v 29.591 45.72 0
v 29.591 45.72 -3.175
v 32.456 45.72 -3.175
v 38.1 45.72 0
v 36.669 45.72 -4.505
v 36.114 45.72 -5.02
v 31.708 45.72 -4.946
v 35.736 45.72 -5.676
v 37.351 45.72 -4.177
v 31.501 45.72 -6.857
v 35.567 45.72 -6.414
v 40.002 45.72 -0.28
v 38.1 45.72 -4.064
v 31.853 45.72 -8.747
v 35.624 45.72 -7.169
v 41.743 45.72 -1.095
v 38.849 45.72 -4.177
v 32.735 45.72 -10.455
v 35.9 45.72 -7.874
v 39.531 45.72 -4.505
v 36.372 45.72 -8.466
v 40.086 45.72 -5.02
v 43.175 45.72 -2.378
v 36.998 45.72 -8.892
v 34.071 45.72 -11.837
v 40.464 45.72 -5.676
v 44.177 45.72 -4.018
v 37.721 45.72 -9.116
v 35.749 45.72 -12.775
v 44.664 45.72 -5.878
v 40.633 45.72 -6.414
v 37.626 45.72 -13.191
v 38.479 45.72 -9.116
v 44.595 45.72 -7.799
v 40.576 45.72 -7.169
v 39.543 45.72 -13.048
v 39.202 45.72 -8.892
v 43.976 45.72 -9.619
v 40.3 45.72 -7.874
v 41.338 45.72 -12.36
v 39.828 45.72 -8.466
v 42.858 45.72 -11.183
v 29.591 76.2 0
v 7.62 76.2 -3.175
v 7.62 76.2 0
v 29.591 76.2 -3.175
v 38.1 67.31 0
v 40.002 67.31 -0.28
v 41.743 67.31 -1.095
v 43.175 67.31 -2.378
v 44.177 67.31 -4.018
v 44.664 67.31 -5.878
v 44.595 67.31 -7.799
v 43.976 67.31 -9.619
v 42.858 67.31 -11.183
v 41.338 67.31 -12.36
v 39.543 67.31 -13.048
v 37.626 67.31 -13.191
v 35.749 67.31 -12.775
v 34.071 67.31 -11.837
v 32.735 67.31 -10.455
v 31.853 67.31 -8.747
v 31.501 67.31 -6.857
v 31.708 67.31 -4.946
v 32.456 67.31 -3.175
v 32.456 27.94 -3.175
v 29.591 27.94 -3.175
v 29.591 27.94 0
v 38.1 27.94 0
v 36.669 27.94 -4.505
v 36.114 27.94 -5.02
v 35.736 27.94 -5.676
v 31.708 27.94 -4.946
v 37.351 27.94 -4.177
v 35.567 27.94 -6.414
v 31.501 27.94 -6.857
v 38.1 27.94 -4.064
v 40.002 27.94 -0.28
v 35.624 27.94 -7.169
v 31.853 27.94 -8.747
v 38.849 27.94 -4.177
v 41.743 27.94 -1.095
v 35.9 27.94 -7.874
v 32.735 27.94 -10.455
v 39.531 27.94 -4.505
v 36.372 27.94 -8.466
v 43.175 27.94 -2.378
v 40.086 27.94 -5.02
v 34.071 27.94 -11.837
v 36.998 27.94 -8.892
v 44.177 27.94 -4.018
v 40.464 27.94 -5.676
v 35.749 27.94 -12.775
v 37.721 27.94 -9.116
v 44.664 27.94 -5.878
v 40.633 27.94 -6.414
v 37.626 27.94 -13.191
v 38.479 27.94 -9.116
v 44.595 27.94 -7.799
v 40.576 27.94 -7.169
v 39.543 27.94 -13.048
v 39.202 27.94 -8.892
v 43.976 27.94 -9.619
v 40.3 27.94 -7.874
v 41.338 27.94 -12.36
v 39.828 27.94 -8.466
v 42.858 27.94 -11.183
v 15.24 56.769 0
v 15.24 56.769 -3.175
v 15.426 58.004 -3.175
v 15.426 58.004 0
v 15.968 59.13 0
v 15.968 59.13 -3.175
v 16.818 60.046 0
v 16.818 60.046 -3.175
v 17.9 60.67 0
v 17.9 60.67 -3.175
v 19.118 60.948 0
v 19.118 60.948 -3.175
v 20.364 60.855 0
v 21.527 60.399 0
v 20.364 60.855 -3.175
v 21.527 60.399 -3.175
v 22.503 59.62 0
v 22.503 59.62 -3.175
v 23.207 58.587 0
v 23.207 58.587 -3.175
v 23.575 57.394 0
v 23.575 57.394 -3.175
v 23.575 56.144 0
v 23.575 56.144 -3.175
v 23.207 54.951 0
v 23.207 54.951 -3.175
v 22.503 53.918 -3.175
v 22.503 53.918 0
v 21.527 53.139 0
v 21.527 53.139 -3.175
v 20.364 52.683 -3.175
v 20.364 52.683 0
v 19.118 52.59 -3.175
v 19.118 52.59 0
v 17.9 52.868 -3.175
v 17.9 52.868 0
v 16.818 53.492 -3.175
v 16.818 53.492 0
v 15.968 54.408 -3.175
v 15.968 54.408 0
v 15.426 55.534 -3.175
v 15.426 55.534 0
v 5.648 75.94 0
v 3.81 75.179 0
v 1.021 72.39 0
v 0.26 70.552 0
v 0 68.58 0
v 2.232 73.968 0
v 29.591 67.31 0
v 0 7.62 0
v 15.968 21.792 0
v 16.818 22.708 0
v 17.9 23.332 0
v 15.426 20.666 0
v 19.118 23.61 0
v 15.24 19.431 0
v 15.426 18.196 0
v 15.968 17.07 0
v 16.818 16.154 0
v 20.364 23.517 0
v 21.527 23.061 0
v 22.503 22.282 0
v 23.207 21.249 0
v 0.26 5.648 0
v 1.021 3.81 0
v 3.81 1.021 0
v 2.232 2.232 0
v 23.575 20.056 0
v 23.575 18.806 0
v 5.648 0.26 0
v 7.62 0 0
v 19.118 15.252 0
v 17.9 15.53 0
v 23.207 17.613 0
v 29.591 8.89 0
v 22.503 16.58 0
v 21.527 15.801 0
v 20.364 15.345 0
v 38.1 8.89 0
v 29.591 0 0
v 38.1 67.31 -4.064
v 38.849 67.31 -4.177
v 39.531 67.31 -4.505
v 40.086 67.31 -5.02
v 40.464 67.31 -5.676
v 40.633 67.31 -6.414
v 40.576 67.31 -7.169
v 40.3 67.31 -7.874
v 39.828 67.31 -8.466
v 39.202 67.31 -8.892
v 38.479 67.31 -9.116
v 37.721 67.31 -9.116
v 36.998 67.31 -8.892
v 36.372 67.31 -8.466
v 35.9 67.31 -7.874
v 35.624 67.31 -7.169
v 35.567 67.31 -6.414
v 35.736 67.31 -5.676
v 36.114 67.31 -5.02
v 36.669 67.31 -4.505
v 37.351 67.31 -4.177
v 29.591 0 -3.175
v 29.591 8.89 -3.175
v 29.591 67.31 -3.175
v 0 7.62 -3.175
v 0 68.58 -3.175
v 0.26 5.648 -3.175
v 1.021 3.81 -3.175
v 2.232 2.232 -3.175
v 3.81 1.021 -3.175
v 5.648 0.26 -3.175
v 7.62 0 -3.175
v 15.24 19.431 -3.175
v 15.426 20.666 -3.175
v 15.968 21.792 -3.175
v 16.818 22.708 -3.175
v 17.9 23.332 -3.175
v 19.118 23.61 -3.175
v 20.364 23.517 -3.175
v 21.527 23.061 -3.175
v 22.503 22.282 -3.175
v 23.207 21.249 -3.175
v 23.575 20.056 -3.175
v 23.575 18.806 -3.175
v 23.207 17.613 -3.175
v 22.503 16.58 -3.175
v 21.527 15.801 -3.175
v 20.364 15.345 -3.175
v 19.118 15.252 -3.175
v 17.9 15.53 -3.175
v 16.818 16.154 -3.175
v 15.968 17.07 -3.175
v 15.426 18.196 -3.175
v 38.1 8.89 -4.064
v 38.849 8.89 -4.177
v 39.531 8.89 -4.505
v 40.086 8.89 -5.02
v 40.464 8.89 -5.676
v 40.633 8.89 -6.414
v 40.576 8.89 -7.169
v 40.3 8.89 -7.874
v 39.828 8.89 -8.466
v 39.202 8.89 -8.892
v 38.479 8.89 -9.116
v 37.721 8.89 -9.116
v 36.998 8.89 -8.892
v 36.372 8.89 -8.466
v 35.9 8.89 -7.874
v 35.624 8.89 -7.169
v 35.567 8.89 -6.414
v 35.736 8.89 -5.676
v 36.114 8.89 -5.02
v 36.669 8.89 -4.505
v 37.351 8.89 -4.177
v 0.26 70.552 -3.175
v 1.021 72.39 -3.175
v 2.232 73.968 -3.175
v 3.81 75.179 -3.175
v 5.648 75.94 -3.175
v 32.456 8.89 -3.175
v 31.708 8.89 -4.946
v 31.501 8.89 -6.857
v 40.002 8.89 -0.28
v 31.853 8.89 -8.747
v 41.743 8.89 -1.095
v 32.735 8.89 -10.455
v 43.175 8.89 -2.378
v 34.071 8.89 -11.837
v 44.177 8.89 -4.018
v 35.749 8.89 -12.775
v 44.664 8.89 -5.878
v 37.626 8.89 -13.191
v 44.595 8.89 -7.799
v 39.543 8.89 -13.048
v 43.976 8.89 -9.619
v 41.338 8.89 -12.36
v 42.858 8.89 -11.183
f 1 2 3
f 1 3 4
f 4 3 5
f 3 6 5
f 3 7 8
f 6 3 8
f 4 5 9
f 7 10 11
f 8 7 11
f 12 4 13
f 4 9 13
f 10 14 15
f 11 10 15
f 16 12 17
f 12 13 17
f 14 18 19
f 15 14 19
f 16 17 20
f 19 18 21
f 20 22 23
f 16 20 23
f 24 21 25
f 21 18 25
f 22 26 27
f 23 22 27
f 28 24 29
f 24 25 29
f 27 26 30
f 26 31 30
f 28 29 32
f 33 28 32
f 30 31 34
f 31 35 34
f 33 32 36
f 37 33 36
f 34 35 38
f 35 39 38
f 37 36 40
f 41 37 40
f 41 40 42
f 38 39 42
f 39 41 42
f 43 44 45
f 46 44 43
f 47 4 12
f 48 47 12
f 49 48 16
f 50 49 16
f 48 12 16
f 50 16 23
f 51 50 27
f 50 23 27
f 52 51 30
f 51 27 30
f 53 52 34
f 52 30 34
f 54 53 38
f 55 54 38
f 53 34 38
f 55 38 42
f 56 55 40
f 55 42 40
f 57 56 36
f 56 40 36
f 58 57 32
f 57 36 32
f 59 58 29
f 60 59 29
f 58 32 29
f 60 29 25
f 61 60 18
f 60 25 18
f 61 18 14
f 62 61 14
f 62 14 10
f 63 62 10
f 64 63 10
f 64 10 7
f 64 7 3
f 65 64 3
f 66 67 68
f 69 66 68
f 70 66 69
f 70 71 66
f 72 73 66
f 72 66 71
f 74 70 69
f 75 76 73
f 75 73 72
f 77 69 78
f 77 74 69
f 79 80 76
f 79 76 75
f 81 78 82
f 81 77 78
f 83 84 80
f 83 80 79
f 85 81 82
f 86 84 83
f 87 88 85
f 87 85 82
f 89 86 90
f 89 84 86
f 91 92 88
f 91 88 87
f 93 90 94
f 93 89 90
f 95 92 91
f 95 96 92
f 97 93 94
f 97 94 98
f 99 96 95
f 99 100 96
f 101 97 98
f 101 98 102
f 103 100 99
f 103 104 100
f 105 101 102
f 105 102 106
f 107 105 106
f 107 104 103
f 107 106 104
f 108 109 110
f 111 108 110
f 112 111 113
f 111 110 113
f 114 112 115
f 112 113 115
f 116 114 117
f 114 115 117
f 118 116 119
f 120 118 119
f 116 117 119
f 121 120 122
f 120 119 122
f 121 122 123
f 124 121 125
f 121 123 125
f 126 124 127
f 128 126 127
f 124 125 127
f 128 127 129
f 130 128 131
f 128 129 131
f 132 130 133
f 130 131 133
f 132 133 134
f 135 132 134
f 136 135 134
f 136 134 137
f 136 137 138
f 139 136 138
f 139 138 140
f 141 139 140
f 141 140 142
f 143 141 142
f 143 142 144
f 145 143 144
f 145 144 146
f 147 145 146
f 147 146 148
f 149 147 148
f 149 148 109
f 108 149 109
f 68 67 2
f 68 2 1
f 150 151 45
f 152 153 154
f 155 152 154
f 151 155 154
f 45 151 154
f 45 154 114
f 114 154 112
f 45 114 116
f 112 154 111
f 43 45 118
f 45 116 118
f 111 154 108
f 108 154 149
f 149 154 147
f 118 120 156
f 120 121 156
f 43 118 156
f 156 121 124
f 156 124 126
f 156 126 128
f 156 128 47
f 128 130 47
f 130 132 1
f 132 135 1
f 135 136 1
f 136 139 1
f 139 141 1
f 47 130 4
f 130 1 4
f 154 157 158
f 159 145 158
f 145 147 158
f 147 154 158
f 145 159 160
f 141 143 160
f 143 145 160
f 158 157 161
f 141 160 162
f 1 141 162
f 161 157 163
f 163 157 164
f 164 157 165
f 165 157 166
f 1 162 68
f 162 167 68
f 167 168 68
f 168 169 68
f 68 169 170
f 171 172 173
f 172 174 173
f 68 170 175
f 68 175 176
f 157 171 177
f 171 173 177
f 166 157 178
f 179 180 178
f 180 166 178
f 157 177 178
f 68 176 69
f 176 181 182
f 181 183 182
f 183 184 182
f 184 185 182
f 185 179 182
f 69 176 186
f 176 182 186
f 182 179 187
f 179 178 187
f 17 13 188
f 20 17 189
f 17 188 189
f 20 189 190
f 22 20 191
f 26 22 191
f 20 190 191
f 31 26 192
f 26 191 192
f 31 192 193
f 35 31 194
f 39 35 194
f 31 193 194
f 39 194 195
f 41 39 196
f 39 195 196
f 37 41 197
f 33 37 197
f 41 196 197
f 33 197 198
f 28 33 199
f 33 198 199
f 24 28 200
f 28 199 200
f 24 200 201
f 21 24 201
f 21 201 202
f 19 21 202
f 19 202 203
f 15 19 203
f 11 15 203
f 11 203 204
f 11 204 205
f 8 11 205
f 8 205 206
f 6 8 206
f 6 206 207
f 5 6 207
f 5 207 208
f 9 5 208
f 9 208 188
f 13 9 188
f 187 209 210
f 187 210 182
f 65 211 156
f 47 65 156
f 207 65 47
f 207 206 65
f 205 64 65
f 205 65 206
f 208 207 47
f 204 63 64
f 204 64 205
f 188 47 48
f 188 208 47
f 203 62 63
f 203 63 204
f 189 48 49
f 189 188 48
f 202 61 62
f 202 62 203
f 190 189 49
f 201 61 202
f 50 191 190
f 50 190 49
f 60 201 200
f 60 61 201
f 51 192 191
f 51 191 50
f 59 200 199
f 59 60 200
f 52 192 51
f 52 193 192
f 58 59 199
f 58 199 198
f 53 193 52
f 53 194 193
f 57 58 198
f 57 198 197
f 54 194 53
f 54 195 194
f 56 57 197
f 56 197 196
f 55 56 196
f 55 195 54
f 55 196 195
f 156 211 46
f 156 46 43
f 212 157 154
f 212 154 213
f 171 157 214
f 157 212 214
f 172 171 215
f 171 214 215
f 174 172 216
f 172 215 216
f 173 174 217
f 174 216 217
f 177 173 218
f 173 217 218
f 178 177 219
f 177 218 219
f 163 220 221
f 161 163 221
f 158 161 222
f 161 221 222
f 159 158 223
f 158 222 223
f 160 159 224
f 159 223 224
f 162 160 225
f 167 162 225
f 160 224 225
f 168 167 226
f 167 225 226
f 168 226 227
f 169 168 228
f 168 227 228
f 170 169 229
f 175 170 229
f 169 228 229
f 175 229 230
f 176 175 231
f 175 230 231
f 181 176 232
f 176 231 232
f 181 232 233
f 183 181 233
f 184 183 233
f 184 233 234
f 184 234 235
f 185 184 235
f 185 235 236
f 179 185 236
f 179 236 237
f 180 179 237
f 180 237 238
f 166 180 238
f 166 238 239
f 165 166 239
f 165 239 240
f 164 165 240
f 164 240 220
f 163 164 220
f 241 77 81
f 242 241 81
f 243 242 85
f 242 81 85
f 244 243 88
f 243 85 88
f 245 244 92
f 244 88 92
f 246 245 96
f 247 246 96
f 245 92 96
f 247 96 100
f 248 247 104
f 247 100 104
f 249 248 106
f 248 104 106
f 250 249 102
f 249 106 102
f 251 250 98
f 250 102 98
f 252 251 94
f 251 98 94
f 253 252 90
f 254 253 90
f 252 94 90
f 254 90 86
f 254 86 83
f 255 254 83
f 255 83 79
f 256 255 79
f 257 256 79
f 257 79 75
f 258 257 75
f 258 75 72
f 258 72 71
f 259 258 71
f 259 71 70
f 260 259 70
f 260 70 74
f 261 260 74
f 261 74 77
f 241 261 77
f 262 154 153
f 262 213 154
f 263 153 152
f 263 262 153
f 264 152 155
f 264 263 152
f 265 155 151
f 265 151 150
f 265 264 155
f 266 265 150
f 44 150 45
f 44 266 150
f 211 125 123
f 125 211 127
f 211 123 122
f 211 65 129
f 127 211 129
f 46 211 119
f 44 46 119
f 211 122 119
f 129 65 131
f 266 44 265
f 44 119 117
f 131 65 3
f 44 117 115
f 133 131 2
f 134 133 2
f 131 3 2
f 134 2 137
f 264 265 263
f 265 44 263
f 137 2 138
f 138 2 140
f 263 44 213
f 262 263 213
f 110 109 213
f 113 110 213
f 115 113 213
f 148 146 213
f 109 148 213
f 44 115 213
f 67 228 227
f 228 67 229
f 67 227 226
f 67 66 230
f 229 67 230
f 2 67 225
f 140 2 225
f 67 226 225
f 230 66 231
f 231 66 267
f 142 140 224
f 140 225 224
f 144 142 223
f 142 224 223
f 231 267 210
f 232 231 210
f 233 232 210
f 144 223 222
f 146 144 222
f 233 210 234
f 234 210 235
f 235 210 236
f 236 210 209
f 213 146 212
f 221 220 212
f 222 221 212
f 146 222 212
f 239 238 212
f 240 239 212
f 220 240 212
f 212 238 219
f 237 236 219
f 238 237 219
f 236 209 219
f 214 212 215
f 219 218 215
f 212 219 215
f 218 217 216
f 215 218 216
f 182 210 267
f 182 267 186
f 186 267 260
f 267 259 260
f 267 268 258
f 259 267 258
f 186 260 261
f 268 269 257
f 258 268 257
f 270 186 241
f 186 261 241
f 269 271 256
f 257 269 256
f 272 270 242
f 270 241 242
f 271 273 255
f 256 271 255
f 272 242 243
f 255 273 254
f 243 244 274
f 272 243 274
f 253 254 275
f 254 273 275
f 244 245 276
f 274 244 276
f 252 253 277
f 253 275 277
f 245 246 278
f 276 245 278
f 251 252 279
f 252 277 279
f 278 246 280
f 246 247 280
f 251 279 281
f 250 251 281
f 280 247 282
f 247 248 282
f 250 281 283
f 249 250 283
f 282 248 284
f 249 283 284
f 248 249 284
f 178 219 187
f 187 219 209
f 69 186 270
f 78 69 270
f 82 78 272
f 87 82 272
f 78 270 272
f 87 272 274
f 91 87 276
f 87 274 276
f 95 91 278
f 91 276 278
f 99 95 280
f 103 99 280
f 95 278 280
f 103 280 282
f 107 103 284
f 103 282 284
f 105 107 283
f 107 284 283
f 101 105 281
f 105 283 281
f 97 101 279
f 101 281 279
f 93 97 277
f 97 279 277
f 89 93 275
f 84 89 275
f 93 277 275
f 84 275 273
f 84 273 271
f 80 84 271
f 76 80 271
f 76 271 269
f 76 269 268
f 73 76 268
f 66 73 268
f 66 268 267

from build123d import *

# Parameters (mm, degrees)
BOSS_EXTRUDE1_DEPTH = 76.2
SKETCH2_R           = 4.191
CUT_EXTRUDE1_DEPTH  = 50.8
CUT_EXTRUDE2_DEPTH  = 8.89
CUT_EXTRUDE3_START  = 27.94
CUT_EXTRUDE3_DEPTH  = 17.78
SKETCH3_R           = 2.54
CUT_EXTRUDE4_DEPTH  = 90.327145258
CUT_EXTRUDE5_START  = 67.31
CUT_EXTRUDE5_DEPTH  = 8.89
FILLET1_R           = 7.62
FILLET2_R           = 7.62


with BuildPart() as part:
    # Sketch1 → Boss-Extrude1 (new body)
    with BuildSketch(Plane(origin=(0, 0, 0), x_dir=(1, 0, 0), z_dir=(0, 1, 0))):
        with BuildLine():
            Line((0, 0), (38.1, 0))
            ThreePointArc((38.1, 0), (41.337877391, 12.35977675), (32.455996545, 3.175))
            Line((32.455996545, 3.175), (0, 3.175))
            Line((0, 3.175), (0, 0))
        make_face()
    extrude(amount=BOSS_EXTRUDE1_DEPTH)

    # Sketch2 → Cut-Extrude1 (cut)
    with BuildSketch(Plane(origin=(0, 0, -3.175), x_dir=(-1, 0, 0), z_dir=(0, 0, -1))):
        with Locations((-19.431, 56.769)):
            Circle(SKETCH2_R)
        with Locations((-19.431, 19.431)):
            Circle(SKETCH2_R)
    extrude(amount=-CUT_EXTRUDE1_DEPTH, mode=Mode.SUBTRACT)

    # Sketch1<3> → Cut-Extrude2 (cut)
    with BuildSketch(Plane(origin=(0, 0, 0), x_dir=(1, 0, 0), z_dir=(0, 1, 0))):
        with BuildLine():
            Line((32.455996545, 3.175), (29.591, 3.175))
            Line((29.591, 3.175), (29.591, 0))
            Line((29.591, 0), (38.1, 0))
            ThreePointArc((38.1, 0), (41.337877391, 12.35977675), (32.455996545, 3.175))
        make_face()
    extrude(amount=CUT_EXTRUDE2_DEPTH, mode=Mode.SUBTRACT)

    # Sketch1<5> → Cut-Extrude3 (cut)
    with BuildSketch(Plane(origin=(0, 0, 0), x_dir=(1, 0, 0), z_dir=(0, 1, 0)).offset(CUT_EXTRUDE3_START)):
        with BuildLine():
            Line((32.455996545, 3.175), (29.591, 3.175))
            Line((29.591, 3.175), (29.591, 0))
            Line((29.591, 0), (38.1, 0))
            ThreePointArc((38.1, 0), (41.337877391, 12.35977675), (32.455996545, 3.175))
        make_face()
    extrude(amount=CUT_EXTRUDE3_DEPTH, mode=Mode.SUBTRACT)

    # Sketch3 → Cut-Extrude4 (cut, through all)
    with BuildSketch(Plane(origin=(0, 76.2, 0), x_dir=(1, 0, 0), z_dir=(0, 1, 0))):
        with Locations((38.1, 6.604)):
            Circle(SKETCH3_R)
    extrude(amount=-CUT_EXTRUDE4_DEPTH, mode=Mode.SUBTRACT)

    # Sketch1<6> → Cut-Extrude5 (cut)
    with BuildSketch(Plane(origin=(0, 0, 0), x_dir=(1, 0, 0), z_dir=(0, 1, 0)).offset(CUT_EXTRUDE5_START)):
        with BuildLine():
            Line((32.455996545, 3.175), (29.591, 3.175))
            Line((29.591, 3.175), (29.591, 0))
            Line((29.591, 0), (38.1, 0))
            ThreePointArc((38.1, 0), (41.337877391, 12.35977675), (32.455996545, 3.175))
        make_face()
    extrude(amount=CUT_EXTRUDE5_DEPTH, mode=Mode.SUBTRACT)

    # Fillet1
    fillet1_edges = [part.edges().sort_by_distance(p)[0] for p in [
        (0, 0, -1.5875),
    ]]
    fillet(fillet1_edges, radius=FILLET1_R)

    # Fillet2
    fillet2_edges = [part.edges().sort_by_distance(p)[0] for p in [
        (0, 76.2, -1.5875),
    ]]
    fillet(fillet2_edges, radius=FILLET2_R)


solid = part.part
